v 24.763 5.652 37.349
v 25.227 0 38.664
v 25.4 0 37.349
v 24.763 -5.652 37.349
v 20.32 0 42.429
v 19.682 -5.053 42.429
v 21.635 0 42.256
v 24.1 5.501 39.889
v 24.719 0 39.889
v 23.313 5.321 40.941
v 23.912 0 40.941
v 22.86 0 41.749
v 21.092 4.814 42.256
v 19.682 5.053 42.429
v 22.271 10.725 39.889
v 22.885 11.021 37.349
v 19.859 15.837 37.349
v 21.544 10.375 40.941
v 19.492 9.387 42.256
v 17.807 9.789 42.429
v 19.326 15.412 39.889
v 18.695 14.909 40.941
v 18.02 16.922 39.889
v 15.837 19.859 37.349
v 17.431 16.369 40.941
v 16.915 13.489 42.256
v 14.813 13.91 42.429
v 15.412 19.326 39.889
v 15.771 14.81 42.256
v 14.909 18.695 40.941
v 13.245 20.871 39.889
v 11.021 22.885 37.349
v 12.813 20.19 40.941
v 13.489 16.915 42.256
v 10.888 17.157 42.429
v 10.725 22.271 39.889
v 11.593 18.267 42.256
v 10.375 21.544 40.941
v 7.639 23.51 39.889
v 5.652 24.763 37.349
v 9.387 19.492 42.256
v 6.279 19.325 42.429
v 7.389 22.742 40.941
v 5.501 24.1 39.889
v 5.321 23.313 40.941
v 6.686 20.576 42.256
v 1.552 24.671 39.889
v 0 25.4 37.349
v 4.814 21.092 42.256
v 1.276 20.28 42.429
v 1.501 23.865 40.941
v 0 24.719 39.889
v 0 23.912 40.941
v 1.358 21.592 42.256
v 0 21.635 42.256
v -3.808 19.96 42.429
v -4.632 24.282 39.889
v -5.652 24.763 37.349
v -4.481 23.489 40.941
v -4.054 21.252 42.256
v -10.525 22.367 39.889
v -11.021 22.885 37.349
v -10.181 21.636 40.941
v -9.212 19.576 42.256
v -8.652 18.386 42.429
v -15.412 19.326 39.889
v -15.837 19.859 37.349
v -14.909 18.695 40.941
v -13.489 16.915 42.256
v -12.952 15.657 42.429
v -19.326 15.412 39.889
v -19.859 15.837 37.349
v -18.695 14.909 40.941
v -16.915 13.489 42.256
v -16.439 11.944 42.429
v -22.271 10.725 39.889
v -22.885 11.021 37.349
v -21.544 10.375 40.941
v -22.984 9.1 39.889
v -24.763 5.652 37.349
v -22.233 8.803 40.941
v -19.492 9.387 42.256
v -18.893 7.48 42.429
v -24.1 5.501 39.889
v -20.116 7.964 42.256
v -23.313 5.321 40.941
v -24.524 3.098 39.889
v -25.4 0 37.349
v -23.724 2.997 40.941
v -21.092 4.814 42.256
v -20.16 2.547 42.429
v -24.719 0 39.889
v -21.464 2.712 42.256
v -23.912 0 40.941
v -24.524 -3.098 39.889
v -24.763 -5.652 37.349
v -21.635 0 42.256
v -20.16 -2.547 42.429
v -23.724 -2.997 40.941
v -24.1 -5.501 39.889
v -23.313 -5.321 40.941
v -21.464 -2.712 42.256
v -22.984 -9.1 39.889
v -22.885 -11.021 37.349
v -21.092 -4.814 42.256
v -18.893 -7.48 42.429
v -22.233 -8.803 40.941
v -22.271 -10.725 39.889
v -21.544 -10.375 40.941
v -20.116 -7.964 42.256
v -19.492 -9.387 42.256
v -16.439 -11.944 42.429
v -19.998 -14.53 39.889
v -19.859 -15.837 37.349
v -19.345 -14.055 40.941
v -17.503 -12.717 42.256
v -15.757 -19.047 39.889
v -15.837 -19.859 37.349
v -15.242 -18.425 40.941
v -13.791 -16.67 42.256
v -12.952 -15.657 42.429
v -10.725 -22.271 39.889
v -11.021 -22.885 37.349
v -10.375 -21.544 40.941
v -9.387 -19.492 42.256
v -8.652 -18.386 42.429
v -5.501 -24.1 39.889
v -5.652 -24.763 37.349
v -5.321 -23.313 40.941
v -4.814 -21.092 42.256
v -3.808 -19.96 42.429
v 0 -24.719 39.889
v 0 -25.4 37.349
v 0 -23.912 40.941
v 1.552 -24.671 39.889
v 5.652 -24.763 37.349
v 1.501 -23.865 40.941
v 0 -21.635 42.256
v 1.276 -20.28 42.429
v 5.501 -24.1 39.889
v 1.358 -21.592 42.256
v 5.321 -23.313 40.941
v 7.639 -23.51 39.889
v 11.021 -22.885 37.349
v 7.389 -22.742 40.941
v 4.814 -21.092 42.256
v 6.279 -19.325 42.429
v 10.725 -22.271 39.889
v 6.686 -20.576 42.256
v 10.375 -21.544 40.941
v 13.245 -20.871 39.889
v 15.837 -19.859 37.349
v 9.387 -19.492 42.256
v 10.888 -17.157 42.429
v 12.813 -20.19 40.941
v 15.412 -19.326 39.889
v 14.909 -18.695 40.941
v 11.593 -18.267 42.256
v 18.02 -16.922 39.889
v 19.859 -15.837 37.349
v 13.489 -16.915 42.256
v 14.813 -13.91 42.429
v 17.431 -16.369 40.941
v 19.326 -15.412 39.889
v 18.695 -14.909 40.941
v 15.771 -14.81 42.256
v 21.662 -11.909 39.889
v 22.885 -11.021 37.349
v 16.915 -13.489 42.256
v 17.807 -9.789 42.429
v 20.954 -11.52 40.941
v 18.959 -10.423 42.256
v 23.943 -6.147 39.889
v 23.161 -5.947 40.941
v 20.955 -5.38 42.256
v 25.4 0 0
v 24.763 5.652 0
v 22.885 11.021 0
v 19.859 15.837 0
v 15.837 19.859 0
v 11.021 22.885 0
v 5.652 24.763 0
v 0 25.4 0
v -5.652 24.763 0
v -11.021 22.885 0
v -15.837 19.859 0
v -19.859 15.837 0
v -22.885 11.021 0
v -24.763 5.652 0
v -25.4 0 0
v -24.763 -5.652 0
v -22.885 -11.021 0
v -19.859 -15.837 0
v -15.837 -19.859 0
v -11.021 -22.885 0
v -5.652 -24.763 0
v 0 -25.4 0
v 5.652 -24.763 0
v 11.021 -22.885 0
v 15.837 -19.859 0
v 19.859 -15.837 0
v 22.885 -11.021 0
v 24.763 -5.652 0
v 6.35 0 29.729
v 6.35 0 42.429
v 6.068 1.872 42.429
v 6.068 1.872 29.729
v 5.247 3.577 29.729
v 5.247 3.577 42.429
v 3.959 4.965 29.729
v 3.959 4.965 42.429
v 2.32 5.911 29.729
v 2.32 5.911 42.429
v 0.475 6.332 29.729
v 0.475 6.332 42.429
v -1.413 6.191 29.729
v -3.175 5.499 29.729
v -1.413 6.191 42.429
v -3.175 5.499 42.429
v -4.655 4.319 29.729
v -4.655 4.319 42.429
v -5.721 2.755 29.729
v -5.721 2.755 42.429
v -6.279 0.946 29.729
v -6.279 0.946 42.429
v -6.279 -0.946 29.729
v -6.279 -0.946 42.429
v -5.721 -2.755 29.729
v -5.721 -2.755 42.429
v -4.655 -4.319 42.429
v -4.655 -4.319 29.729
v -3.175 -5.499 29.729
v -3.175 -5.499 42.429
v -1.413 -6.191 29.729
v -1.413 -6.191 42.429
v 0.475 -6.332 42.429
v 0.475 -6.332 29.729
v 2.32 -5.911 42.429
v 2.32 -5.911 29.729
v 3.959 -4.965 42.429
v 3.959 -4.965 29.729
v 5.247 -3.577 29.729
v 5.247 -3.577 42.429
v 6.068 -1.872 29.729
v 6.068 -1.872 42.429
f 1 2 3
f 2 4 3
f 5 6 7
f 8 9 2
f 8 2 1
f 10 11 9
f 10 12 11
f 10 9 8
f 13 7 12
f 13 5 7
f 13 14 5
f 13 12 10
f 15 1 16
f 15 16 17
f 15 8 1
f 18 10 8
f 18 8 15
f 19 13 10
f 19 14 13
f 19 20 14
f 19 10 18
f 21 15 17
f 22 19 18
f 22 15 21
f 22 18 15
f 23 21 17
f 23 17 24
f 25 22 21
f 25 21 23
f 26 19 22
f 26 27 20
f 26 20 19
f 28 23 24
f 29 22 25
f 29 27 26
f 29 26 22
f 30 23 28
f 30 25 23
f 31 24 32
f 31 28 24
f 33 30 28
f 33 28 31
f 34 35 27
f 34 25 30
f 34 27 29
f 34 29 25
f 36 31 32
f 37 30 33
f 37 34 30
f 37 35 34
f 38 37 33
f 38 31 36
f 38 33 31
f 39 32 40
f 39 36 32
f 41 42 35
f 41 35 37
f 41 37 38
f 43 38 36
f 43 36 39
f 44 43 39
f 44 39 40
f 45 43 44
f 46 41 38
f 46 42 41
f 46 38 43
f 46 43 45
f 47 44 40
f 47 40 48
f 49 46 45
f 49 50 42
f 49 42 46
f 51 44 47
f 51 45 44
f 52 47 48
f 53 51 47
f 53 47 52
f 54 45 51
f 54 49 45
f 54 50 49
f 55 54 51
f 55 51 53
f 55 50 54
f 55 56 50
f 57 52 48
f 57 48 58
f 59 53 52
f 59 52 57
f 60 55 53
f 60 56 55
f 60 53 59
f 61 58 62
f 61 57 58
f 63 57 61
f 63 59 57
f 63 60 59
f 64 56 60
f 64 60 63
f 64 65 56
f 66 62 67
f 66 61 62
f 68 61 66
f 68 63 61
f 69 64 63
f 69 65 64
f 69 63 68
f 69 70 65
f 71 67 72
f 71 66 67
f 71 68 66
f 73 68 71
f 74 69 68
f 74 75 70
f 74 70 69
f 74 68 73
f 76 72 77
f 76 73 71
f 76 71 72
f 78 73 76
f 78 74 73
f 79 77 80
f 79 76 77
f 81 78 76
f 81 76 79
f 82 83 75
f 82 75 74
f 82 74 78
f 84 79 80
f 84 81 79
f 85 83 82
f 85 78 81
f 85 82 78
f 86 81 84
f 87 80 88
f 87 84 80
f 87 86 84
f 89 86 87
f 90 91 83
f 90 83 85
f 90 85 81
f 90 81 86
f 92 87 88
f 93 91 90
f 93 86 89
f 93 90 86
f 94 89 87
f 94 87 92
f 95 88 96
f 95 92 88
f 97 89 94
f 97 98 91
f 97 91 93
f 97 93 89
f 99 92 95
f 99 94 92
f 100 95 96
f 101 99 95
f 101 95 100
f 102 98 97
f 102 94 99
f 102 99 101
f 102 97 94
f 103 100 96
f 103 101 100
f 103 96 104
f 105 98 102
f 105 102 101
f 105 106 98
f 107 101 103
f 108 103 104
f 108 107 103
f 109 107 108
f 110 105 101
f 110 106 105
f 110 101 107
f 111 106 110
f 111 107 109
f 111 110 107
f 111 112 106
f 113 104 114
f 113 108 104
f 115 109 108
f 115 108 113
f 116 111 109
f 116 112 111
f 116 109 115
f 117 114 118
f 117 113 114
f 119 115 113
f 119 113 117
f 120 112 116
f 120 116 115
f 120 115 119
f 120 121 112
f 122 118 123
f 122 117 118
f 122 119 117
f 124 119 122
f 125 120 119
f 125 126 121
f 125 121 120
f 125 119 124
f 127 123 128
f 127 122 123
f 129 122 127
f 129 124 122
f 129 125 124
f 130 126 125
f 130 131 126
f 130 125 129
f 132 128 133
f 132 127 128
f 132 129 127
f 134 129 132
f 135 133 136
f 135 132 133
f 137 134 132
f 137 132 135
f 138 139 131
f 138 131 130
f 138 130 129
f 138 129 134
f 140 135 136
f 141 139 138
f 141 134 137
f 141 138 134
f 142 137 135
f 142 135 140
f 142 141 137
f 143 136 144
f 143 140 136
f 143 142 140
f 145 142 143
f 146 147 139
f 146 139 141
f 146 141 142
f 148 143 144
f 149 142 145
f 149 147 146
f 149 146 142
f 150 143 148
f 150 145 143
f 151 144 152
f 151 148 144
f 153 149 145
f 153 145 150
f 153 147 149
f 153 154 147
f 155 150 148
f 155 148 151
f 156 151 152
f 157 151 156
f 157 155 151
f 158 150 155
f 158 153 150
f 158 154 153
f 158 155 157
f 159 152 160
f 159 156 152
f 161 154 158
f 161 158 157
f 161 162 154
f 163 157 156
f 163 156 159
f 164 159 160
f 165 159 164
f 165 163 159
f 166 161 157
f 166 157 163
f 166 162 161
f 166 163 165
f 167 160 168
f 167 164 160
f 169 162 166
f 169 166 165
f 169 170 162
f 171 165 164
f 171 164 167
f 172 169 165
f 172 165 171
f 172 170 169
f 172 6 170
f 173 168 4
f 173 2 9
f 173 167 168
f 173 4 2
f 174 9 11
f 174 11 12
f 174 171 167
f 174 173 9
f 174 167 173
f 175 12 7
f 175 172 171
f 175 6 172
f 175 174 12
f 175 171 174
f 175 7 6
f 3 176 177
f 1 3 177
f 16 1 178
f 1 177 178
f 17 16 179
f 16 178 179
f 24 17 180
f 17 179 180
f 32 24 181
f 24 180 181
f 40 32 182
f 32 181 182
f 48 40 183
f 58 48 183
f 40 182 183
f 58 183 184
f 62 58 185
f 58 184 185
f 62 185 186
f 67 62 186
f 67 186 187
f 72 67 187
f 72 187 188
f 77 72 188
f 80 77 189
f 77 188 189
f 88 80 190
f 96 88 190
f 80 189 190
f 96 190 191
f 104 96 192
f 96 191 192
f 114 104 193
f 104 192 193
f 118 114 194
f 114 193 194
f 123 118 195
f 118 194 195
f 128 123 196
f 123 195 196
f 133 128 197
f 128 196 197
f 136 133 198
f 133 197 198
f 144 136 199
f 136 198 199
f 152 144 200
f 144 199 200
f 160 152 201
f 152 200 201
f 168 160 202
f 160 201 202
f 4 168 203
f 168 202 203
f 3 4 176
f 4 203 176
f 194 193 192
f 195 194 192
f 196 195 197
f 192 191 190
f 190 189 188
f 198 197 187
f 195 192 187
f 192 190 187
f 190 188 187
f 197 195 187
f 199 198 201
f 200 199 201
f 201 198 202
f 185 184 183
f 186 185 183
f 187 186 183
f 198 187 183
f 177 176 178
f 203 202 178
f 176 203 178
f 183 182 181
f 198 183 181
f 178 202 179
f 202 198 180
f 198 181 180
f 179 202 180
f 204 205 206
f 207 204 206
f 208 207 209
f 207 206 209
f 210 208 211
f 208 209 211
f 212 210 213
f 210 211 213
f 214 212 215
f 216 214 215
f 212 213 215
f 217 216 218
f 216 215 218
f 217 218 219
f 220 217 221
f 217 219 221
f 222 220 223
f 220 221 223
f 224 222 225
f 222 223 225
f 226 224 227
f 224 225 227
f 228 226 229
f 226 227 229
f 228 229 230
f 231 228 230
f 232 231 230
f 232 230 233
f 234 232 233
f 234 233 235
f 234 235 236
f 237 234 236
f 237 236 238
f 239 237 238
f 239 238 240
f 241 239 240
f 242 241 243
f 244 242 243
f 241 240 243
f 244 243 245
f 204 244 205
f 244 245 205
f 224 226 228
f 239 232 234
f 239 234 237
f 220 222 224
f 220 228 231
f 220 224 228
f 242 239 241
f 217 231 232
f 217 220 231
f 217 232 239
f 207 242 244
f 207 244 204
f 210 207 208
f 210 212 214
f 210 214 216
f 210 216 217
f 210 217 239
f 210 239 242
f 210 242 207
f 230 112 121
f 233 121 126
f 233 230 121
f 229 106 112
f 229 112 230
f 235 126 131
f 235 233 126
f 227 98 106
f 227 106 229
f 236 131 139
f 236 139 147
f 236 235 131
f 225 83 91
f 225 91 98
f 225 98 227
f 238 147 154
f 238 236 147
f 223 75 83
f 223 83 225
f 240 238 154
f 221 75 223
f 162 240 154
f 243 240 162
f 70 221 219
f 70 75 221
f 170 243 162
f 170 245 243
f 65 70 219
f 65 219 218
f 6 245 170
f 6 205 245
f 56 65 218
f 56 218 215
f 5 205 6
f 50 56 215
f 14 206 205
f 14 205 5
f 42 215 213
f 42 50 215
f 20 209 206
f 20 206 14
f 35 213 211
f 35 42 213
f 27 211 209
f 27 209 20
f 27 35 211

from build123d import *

# Parameters (mm, degrees)
F0_R     = 25.4
F1_DEPTH = 42.42933
F2_R     = 6.35
F3_DEPTH = 12.7
F4_R     = 5.08


with BuildPart() as f1:
    # F0 (on Top) → F1 (new body)
    with BuildSketch(Plane.XY):
        Circle(F0_R)
    extrude(amount=F1_DEPTH)

    # F2 (on face) → F3 (cut)
    with BuildSketch(Plane.XY.offset(42.42933)):
        Circle(F2_R)
    extrude(amount=-F3_DEPTH, mode=Mode.SUBTRACT)

    # F4
    f4_edges = [f1.edges().sort_by_distance(p)[0] for p in [
        (-25.4, 0, 42.42933),
    ]]
    fillet(f4_edges, radius=F4_R)


solid = f1.part
